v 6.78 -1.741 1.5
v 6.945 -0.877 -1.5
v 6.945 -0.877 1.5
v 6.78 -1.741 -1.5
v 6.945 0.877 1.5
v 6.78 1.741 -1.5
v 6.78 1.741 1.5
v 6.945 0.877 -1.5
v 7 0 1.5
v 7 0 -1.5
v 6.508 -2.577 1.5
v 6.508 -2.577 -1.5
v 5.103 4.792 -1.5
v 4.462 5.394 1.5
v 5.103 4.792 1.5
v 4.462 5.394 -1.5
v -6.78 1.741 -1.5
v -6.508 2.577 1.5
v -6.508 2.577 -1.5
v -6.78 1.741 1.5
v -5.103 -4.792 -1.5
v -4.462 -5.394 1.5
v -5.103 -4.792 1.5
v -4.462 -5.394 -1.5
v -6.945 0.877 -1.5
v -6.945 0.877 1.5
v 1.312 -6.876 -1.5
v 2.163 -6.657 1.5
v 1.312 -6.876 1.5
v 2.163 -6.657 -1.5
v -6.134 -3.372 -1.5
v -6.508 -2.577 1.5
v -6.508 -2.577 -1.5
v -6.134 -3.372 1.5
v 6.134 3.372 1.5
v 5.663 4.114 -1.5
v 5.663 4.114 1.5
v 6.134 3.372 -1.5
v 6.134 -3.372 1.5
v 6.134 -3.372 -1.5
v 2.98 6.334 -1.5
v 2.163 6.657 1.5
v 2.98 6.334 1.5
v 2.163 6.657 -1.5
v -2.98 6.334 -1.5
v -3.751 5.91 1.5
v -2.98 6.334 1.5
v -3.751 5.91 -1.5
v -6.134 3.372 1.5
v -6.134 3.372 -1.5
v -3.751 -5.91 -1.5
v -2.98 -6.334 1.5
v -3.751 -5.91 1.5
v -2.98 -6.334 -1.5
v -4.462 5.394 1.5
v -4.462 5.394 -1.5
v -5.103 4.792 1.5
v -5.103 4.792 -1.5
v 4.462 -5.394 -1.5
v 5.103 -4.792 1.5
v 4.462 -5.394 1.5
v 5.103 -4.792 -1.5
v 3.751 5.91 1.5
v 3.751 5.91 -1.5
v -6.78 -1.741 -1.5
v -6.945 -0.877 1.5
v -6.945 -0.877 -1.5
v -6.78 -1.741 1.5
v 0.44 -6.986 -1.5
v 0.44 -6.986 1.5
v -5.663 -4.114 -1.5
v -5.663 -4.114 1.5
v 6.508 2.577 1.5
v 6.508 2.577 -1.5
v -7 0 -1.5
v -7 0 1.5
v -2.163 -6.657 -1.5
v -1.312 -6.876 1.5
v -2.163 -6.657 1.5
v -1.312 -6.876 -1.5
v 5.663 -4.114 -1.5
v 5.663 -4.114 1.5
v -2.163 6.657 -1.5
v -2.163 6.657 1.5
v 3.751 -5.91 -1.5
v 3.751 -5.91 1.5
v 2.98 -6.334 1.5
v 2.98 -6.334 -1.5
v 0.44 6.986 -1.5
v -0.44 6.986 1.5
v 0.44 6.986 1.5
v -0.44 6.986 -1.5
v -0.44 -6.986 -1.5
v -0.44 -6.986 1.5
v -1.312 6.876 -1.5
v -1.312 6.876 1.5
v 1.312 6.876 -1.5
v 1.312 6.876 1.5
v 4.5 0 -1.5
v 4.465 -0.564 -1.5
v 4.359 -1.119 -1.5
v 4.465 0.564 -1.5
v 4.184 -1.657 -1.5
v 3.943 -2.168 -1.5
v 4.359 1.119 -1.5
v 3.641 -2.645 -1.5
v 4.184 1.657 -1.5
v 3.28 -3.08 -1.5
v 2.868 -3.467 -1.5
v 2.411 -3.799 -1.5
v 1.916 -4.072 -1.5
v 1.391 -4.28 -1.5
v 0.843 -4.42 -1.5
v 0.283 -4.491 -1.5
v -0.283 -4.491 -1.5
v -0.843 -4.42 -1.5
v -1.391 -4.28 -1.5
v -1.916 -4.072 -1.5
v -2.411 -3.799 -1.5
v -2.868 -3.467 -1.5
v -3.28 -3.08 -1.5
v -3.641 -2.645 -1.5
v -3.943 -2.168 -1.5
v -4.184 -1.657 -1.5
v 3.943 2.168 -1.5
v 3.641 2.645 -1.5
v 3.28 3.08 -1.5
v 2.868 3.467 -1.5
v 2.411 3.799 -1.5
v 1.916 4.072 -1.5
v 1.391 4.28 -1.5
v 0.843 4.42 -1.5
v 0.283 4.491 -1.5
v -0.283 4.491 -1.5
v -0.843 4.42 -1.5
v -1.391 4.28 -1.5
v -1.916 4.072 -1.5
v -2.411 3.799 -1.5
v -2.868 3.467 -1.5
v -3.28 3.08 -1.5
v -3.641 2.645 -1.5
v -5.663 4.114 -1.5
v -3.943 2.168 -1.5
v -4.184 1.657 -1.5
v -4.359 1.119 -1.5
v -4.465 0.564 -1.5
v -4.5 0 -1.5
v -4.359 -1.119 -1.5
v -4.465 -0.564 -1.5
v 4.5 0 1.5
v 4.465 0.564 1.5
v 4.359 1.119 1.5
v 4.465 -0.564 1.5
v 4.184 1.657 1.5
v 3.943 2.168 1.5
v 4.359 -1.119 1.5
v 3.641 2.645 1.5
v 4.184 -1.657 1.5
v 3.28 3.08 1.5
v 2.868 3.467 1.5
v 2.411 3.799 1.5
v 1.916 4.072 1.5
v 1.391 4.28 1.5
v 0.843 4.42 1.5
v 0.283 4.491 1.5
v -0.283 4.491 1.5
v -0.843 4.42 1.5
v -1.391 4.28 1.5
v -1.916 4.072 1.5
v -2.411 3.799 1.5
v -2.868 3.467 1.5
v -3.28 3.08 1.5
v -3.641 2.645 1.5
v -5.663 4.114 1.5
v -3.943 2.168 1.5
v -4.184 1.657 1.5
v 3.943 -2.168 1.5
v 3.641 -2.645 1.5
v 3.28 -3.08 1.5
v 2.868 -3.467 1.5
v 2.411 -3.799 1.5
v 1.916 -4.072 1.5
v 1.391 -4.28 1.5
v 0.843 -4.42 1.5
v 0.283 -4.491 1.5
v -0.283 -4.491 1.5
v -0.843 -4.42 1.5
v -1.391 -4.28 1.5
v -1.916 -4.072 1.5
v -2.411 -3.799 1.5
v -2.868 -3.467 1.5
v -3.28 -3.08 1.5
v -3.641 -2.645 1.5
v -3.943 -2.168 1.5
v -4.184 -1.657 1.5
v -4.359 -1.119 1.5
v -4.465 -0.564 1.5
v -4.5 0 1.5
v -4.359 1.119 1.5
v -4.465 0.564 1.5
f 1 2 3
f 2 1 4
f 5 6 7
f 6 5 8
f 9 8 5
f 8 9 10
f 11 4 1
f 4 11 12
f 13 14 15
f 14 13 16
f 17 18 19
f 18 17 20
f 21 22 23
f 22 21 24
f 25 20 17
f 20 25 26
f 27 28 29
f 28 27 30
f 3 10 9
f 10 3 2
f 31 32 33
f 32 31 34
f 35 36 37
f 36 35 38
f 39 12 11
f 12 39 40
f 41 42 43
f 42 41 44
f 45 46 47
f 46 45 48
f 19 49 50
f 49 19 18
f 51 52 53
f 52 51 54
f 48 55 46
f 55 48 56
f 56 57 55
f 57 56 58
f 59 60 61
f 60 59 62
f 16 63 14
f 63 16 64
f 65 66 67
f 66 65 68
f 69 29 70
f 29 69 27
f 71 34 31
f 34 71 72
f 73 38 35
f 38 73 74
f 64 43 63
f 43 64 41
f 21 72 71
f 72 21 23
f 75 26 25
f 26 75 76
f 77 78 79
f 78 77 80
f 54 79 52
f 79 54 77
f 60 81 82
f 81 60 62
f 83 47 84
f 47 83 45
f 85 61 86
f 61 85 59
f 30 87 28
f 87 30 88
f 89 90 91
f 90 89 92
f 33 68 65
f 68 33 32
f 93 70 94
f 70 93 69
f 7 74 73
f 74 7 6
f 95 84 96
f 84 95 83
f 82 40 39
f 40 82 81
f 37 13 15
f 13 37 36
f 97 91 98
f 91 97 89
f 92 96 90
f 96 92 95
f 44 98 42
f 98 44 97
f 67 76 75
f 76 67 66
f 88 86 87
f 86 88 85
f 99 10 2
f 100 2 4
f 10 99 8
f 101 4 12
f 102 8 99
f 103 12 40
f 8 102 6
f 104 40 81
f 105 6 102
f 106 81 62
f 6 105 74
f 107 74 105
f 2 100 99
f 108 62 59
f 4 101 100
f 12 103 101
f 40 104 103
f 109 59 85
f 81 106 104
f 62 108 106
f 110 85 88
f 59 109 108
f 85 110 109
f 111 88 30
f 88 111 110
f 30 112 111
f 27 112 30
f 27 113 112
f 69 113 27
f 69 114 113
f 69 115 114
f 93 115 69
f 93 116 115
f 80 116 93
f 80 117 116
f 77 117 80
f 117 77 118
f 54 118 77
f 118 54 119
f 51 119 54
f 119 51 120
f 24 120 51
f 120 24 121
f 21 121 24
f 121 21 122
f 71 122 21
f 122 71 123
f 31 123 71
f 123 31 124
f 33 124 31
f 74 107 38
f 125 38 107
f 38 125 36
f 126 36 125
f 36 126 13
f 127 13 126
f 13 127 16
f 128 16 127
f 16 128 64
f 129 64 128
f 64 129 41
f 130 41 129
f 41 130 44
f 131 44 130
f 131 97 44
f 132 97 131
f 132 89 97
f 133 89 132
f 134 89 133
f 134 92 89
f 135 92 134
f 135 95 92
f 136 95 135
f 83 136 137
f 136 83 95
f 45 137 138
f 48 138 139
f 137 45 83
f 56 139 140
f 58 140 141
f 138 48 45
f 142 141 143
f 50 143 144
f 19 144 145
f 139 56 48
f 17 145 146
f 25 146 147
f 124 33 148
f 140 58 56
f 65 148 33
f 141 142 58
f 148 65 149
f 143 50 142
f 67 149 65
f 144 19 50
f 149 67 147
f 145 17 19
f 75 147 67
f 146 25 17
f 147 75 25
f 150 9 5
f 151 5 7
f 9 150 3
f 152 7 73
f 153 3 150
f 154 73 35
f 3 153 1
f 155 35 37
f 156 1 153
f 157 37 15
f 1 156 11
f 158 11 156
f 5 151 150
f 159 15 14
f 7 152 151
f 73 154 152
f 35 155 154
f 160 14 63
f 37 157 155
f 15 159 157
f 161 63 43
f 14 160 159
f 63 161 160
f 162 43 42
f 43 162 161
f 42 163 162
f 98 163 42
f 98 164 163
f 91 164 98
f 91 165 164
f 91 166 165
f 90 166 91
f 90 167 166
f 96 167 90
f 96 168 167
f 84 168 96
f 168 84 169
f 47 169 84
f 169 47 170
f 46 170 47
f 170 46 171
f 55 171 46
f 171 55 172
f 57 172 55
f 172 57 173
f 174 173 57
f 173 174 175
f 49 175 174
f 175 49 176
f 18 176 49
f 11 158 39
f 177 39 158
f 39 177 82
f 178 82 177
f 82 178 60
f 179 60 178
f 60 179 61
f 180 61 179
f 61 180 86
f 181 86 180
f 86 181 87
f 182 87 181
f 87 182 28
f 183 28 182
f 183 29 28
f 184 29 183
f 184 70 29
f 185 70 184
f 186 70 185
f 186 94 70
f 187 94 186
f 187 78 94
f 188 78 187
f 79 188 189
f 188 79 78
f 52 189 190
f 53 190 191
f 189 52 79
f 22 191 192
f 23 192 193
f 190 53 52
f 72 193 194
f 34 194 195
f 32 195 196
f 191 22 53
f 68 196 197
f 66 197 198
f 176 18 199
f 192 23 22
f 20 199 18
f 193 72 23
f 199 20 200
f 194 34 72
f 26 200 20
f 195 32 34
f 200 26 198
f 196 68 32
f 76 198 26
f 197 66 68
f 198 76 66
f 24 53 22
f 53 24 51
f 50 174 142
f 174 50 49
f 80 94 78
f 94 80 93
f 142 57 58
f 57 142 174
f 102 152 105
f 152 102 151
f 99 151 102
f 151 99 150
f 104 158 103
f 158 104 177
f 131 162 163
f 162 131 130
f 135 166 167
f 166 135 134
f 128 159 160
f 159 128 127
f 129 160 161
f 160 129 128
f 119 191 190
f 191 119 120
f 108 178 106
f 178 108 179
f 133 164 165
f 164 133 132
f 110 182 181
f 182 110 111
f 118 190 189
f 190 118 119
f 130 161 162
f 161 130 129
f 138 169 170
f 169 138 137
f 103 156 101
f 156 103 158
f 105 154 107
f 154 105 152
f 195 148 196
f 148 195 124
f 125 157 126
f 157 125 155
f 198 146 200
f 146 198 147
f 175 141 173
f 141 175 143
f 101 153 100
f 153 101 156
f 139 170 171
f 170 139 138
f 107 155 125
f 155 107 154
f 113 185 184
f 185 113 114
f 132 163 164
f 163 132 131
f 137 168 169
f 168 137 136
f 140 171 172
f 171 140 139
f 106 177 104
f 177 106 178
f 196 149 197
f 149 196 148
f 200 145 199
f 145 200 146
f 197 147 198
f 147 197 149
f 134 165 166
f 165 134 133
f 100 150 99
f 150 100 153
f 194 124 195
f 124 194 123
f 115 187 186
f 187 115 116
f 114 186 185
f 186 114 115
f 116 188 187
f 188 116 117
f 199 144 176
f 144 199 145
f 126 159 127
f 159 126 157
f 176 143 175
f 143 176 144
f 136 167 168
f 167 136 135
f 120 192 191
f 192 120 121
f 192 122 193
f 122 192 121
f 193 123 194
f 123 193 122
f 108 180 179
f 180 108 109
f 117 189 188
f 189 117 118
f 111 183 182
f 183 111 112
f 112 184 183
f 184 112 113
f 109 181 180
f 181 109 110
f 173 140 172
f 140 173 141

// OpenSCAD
$fn = 50;


difference() {
	union() {
		translate(v = [0, 0, -1.5000000000]) {
			cylinder(h = 3, r = 7.0000000000);
		}
	}
	union() {
		translate(v = [0, 0, -100.0000000000]) {
			cylinder(h = 200, r = 4.5000000000);
		}
	}
}
